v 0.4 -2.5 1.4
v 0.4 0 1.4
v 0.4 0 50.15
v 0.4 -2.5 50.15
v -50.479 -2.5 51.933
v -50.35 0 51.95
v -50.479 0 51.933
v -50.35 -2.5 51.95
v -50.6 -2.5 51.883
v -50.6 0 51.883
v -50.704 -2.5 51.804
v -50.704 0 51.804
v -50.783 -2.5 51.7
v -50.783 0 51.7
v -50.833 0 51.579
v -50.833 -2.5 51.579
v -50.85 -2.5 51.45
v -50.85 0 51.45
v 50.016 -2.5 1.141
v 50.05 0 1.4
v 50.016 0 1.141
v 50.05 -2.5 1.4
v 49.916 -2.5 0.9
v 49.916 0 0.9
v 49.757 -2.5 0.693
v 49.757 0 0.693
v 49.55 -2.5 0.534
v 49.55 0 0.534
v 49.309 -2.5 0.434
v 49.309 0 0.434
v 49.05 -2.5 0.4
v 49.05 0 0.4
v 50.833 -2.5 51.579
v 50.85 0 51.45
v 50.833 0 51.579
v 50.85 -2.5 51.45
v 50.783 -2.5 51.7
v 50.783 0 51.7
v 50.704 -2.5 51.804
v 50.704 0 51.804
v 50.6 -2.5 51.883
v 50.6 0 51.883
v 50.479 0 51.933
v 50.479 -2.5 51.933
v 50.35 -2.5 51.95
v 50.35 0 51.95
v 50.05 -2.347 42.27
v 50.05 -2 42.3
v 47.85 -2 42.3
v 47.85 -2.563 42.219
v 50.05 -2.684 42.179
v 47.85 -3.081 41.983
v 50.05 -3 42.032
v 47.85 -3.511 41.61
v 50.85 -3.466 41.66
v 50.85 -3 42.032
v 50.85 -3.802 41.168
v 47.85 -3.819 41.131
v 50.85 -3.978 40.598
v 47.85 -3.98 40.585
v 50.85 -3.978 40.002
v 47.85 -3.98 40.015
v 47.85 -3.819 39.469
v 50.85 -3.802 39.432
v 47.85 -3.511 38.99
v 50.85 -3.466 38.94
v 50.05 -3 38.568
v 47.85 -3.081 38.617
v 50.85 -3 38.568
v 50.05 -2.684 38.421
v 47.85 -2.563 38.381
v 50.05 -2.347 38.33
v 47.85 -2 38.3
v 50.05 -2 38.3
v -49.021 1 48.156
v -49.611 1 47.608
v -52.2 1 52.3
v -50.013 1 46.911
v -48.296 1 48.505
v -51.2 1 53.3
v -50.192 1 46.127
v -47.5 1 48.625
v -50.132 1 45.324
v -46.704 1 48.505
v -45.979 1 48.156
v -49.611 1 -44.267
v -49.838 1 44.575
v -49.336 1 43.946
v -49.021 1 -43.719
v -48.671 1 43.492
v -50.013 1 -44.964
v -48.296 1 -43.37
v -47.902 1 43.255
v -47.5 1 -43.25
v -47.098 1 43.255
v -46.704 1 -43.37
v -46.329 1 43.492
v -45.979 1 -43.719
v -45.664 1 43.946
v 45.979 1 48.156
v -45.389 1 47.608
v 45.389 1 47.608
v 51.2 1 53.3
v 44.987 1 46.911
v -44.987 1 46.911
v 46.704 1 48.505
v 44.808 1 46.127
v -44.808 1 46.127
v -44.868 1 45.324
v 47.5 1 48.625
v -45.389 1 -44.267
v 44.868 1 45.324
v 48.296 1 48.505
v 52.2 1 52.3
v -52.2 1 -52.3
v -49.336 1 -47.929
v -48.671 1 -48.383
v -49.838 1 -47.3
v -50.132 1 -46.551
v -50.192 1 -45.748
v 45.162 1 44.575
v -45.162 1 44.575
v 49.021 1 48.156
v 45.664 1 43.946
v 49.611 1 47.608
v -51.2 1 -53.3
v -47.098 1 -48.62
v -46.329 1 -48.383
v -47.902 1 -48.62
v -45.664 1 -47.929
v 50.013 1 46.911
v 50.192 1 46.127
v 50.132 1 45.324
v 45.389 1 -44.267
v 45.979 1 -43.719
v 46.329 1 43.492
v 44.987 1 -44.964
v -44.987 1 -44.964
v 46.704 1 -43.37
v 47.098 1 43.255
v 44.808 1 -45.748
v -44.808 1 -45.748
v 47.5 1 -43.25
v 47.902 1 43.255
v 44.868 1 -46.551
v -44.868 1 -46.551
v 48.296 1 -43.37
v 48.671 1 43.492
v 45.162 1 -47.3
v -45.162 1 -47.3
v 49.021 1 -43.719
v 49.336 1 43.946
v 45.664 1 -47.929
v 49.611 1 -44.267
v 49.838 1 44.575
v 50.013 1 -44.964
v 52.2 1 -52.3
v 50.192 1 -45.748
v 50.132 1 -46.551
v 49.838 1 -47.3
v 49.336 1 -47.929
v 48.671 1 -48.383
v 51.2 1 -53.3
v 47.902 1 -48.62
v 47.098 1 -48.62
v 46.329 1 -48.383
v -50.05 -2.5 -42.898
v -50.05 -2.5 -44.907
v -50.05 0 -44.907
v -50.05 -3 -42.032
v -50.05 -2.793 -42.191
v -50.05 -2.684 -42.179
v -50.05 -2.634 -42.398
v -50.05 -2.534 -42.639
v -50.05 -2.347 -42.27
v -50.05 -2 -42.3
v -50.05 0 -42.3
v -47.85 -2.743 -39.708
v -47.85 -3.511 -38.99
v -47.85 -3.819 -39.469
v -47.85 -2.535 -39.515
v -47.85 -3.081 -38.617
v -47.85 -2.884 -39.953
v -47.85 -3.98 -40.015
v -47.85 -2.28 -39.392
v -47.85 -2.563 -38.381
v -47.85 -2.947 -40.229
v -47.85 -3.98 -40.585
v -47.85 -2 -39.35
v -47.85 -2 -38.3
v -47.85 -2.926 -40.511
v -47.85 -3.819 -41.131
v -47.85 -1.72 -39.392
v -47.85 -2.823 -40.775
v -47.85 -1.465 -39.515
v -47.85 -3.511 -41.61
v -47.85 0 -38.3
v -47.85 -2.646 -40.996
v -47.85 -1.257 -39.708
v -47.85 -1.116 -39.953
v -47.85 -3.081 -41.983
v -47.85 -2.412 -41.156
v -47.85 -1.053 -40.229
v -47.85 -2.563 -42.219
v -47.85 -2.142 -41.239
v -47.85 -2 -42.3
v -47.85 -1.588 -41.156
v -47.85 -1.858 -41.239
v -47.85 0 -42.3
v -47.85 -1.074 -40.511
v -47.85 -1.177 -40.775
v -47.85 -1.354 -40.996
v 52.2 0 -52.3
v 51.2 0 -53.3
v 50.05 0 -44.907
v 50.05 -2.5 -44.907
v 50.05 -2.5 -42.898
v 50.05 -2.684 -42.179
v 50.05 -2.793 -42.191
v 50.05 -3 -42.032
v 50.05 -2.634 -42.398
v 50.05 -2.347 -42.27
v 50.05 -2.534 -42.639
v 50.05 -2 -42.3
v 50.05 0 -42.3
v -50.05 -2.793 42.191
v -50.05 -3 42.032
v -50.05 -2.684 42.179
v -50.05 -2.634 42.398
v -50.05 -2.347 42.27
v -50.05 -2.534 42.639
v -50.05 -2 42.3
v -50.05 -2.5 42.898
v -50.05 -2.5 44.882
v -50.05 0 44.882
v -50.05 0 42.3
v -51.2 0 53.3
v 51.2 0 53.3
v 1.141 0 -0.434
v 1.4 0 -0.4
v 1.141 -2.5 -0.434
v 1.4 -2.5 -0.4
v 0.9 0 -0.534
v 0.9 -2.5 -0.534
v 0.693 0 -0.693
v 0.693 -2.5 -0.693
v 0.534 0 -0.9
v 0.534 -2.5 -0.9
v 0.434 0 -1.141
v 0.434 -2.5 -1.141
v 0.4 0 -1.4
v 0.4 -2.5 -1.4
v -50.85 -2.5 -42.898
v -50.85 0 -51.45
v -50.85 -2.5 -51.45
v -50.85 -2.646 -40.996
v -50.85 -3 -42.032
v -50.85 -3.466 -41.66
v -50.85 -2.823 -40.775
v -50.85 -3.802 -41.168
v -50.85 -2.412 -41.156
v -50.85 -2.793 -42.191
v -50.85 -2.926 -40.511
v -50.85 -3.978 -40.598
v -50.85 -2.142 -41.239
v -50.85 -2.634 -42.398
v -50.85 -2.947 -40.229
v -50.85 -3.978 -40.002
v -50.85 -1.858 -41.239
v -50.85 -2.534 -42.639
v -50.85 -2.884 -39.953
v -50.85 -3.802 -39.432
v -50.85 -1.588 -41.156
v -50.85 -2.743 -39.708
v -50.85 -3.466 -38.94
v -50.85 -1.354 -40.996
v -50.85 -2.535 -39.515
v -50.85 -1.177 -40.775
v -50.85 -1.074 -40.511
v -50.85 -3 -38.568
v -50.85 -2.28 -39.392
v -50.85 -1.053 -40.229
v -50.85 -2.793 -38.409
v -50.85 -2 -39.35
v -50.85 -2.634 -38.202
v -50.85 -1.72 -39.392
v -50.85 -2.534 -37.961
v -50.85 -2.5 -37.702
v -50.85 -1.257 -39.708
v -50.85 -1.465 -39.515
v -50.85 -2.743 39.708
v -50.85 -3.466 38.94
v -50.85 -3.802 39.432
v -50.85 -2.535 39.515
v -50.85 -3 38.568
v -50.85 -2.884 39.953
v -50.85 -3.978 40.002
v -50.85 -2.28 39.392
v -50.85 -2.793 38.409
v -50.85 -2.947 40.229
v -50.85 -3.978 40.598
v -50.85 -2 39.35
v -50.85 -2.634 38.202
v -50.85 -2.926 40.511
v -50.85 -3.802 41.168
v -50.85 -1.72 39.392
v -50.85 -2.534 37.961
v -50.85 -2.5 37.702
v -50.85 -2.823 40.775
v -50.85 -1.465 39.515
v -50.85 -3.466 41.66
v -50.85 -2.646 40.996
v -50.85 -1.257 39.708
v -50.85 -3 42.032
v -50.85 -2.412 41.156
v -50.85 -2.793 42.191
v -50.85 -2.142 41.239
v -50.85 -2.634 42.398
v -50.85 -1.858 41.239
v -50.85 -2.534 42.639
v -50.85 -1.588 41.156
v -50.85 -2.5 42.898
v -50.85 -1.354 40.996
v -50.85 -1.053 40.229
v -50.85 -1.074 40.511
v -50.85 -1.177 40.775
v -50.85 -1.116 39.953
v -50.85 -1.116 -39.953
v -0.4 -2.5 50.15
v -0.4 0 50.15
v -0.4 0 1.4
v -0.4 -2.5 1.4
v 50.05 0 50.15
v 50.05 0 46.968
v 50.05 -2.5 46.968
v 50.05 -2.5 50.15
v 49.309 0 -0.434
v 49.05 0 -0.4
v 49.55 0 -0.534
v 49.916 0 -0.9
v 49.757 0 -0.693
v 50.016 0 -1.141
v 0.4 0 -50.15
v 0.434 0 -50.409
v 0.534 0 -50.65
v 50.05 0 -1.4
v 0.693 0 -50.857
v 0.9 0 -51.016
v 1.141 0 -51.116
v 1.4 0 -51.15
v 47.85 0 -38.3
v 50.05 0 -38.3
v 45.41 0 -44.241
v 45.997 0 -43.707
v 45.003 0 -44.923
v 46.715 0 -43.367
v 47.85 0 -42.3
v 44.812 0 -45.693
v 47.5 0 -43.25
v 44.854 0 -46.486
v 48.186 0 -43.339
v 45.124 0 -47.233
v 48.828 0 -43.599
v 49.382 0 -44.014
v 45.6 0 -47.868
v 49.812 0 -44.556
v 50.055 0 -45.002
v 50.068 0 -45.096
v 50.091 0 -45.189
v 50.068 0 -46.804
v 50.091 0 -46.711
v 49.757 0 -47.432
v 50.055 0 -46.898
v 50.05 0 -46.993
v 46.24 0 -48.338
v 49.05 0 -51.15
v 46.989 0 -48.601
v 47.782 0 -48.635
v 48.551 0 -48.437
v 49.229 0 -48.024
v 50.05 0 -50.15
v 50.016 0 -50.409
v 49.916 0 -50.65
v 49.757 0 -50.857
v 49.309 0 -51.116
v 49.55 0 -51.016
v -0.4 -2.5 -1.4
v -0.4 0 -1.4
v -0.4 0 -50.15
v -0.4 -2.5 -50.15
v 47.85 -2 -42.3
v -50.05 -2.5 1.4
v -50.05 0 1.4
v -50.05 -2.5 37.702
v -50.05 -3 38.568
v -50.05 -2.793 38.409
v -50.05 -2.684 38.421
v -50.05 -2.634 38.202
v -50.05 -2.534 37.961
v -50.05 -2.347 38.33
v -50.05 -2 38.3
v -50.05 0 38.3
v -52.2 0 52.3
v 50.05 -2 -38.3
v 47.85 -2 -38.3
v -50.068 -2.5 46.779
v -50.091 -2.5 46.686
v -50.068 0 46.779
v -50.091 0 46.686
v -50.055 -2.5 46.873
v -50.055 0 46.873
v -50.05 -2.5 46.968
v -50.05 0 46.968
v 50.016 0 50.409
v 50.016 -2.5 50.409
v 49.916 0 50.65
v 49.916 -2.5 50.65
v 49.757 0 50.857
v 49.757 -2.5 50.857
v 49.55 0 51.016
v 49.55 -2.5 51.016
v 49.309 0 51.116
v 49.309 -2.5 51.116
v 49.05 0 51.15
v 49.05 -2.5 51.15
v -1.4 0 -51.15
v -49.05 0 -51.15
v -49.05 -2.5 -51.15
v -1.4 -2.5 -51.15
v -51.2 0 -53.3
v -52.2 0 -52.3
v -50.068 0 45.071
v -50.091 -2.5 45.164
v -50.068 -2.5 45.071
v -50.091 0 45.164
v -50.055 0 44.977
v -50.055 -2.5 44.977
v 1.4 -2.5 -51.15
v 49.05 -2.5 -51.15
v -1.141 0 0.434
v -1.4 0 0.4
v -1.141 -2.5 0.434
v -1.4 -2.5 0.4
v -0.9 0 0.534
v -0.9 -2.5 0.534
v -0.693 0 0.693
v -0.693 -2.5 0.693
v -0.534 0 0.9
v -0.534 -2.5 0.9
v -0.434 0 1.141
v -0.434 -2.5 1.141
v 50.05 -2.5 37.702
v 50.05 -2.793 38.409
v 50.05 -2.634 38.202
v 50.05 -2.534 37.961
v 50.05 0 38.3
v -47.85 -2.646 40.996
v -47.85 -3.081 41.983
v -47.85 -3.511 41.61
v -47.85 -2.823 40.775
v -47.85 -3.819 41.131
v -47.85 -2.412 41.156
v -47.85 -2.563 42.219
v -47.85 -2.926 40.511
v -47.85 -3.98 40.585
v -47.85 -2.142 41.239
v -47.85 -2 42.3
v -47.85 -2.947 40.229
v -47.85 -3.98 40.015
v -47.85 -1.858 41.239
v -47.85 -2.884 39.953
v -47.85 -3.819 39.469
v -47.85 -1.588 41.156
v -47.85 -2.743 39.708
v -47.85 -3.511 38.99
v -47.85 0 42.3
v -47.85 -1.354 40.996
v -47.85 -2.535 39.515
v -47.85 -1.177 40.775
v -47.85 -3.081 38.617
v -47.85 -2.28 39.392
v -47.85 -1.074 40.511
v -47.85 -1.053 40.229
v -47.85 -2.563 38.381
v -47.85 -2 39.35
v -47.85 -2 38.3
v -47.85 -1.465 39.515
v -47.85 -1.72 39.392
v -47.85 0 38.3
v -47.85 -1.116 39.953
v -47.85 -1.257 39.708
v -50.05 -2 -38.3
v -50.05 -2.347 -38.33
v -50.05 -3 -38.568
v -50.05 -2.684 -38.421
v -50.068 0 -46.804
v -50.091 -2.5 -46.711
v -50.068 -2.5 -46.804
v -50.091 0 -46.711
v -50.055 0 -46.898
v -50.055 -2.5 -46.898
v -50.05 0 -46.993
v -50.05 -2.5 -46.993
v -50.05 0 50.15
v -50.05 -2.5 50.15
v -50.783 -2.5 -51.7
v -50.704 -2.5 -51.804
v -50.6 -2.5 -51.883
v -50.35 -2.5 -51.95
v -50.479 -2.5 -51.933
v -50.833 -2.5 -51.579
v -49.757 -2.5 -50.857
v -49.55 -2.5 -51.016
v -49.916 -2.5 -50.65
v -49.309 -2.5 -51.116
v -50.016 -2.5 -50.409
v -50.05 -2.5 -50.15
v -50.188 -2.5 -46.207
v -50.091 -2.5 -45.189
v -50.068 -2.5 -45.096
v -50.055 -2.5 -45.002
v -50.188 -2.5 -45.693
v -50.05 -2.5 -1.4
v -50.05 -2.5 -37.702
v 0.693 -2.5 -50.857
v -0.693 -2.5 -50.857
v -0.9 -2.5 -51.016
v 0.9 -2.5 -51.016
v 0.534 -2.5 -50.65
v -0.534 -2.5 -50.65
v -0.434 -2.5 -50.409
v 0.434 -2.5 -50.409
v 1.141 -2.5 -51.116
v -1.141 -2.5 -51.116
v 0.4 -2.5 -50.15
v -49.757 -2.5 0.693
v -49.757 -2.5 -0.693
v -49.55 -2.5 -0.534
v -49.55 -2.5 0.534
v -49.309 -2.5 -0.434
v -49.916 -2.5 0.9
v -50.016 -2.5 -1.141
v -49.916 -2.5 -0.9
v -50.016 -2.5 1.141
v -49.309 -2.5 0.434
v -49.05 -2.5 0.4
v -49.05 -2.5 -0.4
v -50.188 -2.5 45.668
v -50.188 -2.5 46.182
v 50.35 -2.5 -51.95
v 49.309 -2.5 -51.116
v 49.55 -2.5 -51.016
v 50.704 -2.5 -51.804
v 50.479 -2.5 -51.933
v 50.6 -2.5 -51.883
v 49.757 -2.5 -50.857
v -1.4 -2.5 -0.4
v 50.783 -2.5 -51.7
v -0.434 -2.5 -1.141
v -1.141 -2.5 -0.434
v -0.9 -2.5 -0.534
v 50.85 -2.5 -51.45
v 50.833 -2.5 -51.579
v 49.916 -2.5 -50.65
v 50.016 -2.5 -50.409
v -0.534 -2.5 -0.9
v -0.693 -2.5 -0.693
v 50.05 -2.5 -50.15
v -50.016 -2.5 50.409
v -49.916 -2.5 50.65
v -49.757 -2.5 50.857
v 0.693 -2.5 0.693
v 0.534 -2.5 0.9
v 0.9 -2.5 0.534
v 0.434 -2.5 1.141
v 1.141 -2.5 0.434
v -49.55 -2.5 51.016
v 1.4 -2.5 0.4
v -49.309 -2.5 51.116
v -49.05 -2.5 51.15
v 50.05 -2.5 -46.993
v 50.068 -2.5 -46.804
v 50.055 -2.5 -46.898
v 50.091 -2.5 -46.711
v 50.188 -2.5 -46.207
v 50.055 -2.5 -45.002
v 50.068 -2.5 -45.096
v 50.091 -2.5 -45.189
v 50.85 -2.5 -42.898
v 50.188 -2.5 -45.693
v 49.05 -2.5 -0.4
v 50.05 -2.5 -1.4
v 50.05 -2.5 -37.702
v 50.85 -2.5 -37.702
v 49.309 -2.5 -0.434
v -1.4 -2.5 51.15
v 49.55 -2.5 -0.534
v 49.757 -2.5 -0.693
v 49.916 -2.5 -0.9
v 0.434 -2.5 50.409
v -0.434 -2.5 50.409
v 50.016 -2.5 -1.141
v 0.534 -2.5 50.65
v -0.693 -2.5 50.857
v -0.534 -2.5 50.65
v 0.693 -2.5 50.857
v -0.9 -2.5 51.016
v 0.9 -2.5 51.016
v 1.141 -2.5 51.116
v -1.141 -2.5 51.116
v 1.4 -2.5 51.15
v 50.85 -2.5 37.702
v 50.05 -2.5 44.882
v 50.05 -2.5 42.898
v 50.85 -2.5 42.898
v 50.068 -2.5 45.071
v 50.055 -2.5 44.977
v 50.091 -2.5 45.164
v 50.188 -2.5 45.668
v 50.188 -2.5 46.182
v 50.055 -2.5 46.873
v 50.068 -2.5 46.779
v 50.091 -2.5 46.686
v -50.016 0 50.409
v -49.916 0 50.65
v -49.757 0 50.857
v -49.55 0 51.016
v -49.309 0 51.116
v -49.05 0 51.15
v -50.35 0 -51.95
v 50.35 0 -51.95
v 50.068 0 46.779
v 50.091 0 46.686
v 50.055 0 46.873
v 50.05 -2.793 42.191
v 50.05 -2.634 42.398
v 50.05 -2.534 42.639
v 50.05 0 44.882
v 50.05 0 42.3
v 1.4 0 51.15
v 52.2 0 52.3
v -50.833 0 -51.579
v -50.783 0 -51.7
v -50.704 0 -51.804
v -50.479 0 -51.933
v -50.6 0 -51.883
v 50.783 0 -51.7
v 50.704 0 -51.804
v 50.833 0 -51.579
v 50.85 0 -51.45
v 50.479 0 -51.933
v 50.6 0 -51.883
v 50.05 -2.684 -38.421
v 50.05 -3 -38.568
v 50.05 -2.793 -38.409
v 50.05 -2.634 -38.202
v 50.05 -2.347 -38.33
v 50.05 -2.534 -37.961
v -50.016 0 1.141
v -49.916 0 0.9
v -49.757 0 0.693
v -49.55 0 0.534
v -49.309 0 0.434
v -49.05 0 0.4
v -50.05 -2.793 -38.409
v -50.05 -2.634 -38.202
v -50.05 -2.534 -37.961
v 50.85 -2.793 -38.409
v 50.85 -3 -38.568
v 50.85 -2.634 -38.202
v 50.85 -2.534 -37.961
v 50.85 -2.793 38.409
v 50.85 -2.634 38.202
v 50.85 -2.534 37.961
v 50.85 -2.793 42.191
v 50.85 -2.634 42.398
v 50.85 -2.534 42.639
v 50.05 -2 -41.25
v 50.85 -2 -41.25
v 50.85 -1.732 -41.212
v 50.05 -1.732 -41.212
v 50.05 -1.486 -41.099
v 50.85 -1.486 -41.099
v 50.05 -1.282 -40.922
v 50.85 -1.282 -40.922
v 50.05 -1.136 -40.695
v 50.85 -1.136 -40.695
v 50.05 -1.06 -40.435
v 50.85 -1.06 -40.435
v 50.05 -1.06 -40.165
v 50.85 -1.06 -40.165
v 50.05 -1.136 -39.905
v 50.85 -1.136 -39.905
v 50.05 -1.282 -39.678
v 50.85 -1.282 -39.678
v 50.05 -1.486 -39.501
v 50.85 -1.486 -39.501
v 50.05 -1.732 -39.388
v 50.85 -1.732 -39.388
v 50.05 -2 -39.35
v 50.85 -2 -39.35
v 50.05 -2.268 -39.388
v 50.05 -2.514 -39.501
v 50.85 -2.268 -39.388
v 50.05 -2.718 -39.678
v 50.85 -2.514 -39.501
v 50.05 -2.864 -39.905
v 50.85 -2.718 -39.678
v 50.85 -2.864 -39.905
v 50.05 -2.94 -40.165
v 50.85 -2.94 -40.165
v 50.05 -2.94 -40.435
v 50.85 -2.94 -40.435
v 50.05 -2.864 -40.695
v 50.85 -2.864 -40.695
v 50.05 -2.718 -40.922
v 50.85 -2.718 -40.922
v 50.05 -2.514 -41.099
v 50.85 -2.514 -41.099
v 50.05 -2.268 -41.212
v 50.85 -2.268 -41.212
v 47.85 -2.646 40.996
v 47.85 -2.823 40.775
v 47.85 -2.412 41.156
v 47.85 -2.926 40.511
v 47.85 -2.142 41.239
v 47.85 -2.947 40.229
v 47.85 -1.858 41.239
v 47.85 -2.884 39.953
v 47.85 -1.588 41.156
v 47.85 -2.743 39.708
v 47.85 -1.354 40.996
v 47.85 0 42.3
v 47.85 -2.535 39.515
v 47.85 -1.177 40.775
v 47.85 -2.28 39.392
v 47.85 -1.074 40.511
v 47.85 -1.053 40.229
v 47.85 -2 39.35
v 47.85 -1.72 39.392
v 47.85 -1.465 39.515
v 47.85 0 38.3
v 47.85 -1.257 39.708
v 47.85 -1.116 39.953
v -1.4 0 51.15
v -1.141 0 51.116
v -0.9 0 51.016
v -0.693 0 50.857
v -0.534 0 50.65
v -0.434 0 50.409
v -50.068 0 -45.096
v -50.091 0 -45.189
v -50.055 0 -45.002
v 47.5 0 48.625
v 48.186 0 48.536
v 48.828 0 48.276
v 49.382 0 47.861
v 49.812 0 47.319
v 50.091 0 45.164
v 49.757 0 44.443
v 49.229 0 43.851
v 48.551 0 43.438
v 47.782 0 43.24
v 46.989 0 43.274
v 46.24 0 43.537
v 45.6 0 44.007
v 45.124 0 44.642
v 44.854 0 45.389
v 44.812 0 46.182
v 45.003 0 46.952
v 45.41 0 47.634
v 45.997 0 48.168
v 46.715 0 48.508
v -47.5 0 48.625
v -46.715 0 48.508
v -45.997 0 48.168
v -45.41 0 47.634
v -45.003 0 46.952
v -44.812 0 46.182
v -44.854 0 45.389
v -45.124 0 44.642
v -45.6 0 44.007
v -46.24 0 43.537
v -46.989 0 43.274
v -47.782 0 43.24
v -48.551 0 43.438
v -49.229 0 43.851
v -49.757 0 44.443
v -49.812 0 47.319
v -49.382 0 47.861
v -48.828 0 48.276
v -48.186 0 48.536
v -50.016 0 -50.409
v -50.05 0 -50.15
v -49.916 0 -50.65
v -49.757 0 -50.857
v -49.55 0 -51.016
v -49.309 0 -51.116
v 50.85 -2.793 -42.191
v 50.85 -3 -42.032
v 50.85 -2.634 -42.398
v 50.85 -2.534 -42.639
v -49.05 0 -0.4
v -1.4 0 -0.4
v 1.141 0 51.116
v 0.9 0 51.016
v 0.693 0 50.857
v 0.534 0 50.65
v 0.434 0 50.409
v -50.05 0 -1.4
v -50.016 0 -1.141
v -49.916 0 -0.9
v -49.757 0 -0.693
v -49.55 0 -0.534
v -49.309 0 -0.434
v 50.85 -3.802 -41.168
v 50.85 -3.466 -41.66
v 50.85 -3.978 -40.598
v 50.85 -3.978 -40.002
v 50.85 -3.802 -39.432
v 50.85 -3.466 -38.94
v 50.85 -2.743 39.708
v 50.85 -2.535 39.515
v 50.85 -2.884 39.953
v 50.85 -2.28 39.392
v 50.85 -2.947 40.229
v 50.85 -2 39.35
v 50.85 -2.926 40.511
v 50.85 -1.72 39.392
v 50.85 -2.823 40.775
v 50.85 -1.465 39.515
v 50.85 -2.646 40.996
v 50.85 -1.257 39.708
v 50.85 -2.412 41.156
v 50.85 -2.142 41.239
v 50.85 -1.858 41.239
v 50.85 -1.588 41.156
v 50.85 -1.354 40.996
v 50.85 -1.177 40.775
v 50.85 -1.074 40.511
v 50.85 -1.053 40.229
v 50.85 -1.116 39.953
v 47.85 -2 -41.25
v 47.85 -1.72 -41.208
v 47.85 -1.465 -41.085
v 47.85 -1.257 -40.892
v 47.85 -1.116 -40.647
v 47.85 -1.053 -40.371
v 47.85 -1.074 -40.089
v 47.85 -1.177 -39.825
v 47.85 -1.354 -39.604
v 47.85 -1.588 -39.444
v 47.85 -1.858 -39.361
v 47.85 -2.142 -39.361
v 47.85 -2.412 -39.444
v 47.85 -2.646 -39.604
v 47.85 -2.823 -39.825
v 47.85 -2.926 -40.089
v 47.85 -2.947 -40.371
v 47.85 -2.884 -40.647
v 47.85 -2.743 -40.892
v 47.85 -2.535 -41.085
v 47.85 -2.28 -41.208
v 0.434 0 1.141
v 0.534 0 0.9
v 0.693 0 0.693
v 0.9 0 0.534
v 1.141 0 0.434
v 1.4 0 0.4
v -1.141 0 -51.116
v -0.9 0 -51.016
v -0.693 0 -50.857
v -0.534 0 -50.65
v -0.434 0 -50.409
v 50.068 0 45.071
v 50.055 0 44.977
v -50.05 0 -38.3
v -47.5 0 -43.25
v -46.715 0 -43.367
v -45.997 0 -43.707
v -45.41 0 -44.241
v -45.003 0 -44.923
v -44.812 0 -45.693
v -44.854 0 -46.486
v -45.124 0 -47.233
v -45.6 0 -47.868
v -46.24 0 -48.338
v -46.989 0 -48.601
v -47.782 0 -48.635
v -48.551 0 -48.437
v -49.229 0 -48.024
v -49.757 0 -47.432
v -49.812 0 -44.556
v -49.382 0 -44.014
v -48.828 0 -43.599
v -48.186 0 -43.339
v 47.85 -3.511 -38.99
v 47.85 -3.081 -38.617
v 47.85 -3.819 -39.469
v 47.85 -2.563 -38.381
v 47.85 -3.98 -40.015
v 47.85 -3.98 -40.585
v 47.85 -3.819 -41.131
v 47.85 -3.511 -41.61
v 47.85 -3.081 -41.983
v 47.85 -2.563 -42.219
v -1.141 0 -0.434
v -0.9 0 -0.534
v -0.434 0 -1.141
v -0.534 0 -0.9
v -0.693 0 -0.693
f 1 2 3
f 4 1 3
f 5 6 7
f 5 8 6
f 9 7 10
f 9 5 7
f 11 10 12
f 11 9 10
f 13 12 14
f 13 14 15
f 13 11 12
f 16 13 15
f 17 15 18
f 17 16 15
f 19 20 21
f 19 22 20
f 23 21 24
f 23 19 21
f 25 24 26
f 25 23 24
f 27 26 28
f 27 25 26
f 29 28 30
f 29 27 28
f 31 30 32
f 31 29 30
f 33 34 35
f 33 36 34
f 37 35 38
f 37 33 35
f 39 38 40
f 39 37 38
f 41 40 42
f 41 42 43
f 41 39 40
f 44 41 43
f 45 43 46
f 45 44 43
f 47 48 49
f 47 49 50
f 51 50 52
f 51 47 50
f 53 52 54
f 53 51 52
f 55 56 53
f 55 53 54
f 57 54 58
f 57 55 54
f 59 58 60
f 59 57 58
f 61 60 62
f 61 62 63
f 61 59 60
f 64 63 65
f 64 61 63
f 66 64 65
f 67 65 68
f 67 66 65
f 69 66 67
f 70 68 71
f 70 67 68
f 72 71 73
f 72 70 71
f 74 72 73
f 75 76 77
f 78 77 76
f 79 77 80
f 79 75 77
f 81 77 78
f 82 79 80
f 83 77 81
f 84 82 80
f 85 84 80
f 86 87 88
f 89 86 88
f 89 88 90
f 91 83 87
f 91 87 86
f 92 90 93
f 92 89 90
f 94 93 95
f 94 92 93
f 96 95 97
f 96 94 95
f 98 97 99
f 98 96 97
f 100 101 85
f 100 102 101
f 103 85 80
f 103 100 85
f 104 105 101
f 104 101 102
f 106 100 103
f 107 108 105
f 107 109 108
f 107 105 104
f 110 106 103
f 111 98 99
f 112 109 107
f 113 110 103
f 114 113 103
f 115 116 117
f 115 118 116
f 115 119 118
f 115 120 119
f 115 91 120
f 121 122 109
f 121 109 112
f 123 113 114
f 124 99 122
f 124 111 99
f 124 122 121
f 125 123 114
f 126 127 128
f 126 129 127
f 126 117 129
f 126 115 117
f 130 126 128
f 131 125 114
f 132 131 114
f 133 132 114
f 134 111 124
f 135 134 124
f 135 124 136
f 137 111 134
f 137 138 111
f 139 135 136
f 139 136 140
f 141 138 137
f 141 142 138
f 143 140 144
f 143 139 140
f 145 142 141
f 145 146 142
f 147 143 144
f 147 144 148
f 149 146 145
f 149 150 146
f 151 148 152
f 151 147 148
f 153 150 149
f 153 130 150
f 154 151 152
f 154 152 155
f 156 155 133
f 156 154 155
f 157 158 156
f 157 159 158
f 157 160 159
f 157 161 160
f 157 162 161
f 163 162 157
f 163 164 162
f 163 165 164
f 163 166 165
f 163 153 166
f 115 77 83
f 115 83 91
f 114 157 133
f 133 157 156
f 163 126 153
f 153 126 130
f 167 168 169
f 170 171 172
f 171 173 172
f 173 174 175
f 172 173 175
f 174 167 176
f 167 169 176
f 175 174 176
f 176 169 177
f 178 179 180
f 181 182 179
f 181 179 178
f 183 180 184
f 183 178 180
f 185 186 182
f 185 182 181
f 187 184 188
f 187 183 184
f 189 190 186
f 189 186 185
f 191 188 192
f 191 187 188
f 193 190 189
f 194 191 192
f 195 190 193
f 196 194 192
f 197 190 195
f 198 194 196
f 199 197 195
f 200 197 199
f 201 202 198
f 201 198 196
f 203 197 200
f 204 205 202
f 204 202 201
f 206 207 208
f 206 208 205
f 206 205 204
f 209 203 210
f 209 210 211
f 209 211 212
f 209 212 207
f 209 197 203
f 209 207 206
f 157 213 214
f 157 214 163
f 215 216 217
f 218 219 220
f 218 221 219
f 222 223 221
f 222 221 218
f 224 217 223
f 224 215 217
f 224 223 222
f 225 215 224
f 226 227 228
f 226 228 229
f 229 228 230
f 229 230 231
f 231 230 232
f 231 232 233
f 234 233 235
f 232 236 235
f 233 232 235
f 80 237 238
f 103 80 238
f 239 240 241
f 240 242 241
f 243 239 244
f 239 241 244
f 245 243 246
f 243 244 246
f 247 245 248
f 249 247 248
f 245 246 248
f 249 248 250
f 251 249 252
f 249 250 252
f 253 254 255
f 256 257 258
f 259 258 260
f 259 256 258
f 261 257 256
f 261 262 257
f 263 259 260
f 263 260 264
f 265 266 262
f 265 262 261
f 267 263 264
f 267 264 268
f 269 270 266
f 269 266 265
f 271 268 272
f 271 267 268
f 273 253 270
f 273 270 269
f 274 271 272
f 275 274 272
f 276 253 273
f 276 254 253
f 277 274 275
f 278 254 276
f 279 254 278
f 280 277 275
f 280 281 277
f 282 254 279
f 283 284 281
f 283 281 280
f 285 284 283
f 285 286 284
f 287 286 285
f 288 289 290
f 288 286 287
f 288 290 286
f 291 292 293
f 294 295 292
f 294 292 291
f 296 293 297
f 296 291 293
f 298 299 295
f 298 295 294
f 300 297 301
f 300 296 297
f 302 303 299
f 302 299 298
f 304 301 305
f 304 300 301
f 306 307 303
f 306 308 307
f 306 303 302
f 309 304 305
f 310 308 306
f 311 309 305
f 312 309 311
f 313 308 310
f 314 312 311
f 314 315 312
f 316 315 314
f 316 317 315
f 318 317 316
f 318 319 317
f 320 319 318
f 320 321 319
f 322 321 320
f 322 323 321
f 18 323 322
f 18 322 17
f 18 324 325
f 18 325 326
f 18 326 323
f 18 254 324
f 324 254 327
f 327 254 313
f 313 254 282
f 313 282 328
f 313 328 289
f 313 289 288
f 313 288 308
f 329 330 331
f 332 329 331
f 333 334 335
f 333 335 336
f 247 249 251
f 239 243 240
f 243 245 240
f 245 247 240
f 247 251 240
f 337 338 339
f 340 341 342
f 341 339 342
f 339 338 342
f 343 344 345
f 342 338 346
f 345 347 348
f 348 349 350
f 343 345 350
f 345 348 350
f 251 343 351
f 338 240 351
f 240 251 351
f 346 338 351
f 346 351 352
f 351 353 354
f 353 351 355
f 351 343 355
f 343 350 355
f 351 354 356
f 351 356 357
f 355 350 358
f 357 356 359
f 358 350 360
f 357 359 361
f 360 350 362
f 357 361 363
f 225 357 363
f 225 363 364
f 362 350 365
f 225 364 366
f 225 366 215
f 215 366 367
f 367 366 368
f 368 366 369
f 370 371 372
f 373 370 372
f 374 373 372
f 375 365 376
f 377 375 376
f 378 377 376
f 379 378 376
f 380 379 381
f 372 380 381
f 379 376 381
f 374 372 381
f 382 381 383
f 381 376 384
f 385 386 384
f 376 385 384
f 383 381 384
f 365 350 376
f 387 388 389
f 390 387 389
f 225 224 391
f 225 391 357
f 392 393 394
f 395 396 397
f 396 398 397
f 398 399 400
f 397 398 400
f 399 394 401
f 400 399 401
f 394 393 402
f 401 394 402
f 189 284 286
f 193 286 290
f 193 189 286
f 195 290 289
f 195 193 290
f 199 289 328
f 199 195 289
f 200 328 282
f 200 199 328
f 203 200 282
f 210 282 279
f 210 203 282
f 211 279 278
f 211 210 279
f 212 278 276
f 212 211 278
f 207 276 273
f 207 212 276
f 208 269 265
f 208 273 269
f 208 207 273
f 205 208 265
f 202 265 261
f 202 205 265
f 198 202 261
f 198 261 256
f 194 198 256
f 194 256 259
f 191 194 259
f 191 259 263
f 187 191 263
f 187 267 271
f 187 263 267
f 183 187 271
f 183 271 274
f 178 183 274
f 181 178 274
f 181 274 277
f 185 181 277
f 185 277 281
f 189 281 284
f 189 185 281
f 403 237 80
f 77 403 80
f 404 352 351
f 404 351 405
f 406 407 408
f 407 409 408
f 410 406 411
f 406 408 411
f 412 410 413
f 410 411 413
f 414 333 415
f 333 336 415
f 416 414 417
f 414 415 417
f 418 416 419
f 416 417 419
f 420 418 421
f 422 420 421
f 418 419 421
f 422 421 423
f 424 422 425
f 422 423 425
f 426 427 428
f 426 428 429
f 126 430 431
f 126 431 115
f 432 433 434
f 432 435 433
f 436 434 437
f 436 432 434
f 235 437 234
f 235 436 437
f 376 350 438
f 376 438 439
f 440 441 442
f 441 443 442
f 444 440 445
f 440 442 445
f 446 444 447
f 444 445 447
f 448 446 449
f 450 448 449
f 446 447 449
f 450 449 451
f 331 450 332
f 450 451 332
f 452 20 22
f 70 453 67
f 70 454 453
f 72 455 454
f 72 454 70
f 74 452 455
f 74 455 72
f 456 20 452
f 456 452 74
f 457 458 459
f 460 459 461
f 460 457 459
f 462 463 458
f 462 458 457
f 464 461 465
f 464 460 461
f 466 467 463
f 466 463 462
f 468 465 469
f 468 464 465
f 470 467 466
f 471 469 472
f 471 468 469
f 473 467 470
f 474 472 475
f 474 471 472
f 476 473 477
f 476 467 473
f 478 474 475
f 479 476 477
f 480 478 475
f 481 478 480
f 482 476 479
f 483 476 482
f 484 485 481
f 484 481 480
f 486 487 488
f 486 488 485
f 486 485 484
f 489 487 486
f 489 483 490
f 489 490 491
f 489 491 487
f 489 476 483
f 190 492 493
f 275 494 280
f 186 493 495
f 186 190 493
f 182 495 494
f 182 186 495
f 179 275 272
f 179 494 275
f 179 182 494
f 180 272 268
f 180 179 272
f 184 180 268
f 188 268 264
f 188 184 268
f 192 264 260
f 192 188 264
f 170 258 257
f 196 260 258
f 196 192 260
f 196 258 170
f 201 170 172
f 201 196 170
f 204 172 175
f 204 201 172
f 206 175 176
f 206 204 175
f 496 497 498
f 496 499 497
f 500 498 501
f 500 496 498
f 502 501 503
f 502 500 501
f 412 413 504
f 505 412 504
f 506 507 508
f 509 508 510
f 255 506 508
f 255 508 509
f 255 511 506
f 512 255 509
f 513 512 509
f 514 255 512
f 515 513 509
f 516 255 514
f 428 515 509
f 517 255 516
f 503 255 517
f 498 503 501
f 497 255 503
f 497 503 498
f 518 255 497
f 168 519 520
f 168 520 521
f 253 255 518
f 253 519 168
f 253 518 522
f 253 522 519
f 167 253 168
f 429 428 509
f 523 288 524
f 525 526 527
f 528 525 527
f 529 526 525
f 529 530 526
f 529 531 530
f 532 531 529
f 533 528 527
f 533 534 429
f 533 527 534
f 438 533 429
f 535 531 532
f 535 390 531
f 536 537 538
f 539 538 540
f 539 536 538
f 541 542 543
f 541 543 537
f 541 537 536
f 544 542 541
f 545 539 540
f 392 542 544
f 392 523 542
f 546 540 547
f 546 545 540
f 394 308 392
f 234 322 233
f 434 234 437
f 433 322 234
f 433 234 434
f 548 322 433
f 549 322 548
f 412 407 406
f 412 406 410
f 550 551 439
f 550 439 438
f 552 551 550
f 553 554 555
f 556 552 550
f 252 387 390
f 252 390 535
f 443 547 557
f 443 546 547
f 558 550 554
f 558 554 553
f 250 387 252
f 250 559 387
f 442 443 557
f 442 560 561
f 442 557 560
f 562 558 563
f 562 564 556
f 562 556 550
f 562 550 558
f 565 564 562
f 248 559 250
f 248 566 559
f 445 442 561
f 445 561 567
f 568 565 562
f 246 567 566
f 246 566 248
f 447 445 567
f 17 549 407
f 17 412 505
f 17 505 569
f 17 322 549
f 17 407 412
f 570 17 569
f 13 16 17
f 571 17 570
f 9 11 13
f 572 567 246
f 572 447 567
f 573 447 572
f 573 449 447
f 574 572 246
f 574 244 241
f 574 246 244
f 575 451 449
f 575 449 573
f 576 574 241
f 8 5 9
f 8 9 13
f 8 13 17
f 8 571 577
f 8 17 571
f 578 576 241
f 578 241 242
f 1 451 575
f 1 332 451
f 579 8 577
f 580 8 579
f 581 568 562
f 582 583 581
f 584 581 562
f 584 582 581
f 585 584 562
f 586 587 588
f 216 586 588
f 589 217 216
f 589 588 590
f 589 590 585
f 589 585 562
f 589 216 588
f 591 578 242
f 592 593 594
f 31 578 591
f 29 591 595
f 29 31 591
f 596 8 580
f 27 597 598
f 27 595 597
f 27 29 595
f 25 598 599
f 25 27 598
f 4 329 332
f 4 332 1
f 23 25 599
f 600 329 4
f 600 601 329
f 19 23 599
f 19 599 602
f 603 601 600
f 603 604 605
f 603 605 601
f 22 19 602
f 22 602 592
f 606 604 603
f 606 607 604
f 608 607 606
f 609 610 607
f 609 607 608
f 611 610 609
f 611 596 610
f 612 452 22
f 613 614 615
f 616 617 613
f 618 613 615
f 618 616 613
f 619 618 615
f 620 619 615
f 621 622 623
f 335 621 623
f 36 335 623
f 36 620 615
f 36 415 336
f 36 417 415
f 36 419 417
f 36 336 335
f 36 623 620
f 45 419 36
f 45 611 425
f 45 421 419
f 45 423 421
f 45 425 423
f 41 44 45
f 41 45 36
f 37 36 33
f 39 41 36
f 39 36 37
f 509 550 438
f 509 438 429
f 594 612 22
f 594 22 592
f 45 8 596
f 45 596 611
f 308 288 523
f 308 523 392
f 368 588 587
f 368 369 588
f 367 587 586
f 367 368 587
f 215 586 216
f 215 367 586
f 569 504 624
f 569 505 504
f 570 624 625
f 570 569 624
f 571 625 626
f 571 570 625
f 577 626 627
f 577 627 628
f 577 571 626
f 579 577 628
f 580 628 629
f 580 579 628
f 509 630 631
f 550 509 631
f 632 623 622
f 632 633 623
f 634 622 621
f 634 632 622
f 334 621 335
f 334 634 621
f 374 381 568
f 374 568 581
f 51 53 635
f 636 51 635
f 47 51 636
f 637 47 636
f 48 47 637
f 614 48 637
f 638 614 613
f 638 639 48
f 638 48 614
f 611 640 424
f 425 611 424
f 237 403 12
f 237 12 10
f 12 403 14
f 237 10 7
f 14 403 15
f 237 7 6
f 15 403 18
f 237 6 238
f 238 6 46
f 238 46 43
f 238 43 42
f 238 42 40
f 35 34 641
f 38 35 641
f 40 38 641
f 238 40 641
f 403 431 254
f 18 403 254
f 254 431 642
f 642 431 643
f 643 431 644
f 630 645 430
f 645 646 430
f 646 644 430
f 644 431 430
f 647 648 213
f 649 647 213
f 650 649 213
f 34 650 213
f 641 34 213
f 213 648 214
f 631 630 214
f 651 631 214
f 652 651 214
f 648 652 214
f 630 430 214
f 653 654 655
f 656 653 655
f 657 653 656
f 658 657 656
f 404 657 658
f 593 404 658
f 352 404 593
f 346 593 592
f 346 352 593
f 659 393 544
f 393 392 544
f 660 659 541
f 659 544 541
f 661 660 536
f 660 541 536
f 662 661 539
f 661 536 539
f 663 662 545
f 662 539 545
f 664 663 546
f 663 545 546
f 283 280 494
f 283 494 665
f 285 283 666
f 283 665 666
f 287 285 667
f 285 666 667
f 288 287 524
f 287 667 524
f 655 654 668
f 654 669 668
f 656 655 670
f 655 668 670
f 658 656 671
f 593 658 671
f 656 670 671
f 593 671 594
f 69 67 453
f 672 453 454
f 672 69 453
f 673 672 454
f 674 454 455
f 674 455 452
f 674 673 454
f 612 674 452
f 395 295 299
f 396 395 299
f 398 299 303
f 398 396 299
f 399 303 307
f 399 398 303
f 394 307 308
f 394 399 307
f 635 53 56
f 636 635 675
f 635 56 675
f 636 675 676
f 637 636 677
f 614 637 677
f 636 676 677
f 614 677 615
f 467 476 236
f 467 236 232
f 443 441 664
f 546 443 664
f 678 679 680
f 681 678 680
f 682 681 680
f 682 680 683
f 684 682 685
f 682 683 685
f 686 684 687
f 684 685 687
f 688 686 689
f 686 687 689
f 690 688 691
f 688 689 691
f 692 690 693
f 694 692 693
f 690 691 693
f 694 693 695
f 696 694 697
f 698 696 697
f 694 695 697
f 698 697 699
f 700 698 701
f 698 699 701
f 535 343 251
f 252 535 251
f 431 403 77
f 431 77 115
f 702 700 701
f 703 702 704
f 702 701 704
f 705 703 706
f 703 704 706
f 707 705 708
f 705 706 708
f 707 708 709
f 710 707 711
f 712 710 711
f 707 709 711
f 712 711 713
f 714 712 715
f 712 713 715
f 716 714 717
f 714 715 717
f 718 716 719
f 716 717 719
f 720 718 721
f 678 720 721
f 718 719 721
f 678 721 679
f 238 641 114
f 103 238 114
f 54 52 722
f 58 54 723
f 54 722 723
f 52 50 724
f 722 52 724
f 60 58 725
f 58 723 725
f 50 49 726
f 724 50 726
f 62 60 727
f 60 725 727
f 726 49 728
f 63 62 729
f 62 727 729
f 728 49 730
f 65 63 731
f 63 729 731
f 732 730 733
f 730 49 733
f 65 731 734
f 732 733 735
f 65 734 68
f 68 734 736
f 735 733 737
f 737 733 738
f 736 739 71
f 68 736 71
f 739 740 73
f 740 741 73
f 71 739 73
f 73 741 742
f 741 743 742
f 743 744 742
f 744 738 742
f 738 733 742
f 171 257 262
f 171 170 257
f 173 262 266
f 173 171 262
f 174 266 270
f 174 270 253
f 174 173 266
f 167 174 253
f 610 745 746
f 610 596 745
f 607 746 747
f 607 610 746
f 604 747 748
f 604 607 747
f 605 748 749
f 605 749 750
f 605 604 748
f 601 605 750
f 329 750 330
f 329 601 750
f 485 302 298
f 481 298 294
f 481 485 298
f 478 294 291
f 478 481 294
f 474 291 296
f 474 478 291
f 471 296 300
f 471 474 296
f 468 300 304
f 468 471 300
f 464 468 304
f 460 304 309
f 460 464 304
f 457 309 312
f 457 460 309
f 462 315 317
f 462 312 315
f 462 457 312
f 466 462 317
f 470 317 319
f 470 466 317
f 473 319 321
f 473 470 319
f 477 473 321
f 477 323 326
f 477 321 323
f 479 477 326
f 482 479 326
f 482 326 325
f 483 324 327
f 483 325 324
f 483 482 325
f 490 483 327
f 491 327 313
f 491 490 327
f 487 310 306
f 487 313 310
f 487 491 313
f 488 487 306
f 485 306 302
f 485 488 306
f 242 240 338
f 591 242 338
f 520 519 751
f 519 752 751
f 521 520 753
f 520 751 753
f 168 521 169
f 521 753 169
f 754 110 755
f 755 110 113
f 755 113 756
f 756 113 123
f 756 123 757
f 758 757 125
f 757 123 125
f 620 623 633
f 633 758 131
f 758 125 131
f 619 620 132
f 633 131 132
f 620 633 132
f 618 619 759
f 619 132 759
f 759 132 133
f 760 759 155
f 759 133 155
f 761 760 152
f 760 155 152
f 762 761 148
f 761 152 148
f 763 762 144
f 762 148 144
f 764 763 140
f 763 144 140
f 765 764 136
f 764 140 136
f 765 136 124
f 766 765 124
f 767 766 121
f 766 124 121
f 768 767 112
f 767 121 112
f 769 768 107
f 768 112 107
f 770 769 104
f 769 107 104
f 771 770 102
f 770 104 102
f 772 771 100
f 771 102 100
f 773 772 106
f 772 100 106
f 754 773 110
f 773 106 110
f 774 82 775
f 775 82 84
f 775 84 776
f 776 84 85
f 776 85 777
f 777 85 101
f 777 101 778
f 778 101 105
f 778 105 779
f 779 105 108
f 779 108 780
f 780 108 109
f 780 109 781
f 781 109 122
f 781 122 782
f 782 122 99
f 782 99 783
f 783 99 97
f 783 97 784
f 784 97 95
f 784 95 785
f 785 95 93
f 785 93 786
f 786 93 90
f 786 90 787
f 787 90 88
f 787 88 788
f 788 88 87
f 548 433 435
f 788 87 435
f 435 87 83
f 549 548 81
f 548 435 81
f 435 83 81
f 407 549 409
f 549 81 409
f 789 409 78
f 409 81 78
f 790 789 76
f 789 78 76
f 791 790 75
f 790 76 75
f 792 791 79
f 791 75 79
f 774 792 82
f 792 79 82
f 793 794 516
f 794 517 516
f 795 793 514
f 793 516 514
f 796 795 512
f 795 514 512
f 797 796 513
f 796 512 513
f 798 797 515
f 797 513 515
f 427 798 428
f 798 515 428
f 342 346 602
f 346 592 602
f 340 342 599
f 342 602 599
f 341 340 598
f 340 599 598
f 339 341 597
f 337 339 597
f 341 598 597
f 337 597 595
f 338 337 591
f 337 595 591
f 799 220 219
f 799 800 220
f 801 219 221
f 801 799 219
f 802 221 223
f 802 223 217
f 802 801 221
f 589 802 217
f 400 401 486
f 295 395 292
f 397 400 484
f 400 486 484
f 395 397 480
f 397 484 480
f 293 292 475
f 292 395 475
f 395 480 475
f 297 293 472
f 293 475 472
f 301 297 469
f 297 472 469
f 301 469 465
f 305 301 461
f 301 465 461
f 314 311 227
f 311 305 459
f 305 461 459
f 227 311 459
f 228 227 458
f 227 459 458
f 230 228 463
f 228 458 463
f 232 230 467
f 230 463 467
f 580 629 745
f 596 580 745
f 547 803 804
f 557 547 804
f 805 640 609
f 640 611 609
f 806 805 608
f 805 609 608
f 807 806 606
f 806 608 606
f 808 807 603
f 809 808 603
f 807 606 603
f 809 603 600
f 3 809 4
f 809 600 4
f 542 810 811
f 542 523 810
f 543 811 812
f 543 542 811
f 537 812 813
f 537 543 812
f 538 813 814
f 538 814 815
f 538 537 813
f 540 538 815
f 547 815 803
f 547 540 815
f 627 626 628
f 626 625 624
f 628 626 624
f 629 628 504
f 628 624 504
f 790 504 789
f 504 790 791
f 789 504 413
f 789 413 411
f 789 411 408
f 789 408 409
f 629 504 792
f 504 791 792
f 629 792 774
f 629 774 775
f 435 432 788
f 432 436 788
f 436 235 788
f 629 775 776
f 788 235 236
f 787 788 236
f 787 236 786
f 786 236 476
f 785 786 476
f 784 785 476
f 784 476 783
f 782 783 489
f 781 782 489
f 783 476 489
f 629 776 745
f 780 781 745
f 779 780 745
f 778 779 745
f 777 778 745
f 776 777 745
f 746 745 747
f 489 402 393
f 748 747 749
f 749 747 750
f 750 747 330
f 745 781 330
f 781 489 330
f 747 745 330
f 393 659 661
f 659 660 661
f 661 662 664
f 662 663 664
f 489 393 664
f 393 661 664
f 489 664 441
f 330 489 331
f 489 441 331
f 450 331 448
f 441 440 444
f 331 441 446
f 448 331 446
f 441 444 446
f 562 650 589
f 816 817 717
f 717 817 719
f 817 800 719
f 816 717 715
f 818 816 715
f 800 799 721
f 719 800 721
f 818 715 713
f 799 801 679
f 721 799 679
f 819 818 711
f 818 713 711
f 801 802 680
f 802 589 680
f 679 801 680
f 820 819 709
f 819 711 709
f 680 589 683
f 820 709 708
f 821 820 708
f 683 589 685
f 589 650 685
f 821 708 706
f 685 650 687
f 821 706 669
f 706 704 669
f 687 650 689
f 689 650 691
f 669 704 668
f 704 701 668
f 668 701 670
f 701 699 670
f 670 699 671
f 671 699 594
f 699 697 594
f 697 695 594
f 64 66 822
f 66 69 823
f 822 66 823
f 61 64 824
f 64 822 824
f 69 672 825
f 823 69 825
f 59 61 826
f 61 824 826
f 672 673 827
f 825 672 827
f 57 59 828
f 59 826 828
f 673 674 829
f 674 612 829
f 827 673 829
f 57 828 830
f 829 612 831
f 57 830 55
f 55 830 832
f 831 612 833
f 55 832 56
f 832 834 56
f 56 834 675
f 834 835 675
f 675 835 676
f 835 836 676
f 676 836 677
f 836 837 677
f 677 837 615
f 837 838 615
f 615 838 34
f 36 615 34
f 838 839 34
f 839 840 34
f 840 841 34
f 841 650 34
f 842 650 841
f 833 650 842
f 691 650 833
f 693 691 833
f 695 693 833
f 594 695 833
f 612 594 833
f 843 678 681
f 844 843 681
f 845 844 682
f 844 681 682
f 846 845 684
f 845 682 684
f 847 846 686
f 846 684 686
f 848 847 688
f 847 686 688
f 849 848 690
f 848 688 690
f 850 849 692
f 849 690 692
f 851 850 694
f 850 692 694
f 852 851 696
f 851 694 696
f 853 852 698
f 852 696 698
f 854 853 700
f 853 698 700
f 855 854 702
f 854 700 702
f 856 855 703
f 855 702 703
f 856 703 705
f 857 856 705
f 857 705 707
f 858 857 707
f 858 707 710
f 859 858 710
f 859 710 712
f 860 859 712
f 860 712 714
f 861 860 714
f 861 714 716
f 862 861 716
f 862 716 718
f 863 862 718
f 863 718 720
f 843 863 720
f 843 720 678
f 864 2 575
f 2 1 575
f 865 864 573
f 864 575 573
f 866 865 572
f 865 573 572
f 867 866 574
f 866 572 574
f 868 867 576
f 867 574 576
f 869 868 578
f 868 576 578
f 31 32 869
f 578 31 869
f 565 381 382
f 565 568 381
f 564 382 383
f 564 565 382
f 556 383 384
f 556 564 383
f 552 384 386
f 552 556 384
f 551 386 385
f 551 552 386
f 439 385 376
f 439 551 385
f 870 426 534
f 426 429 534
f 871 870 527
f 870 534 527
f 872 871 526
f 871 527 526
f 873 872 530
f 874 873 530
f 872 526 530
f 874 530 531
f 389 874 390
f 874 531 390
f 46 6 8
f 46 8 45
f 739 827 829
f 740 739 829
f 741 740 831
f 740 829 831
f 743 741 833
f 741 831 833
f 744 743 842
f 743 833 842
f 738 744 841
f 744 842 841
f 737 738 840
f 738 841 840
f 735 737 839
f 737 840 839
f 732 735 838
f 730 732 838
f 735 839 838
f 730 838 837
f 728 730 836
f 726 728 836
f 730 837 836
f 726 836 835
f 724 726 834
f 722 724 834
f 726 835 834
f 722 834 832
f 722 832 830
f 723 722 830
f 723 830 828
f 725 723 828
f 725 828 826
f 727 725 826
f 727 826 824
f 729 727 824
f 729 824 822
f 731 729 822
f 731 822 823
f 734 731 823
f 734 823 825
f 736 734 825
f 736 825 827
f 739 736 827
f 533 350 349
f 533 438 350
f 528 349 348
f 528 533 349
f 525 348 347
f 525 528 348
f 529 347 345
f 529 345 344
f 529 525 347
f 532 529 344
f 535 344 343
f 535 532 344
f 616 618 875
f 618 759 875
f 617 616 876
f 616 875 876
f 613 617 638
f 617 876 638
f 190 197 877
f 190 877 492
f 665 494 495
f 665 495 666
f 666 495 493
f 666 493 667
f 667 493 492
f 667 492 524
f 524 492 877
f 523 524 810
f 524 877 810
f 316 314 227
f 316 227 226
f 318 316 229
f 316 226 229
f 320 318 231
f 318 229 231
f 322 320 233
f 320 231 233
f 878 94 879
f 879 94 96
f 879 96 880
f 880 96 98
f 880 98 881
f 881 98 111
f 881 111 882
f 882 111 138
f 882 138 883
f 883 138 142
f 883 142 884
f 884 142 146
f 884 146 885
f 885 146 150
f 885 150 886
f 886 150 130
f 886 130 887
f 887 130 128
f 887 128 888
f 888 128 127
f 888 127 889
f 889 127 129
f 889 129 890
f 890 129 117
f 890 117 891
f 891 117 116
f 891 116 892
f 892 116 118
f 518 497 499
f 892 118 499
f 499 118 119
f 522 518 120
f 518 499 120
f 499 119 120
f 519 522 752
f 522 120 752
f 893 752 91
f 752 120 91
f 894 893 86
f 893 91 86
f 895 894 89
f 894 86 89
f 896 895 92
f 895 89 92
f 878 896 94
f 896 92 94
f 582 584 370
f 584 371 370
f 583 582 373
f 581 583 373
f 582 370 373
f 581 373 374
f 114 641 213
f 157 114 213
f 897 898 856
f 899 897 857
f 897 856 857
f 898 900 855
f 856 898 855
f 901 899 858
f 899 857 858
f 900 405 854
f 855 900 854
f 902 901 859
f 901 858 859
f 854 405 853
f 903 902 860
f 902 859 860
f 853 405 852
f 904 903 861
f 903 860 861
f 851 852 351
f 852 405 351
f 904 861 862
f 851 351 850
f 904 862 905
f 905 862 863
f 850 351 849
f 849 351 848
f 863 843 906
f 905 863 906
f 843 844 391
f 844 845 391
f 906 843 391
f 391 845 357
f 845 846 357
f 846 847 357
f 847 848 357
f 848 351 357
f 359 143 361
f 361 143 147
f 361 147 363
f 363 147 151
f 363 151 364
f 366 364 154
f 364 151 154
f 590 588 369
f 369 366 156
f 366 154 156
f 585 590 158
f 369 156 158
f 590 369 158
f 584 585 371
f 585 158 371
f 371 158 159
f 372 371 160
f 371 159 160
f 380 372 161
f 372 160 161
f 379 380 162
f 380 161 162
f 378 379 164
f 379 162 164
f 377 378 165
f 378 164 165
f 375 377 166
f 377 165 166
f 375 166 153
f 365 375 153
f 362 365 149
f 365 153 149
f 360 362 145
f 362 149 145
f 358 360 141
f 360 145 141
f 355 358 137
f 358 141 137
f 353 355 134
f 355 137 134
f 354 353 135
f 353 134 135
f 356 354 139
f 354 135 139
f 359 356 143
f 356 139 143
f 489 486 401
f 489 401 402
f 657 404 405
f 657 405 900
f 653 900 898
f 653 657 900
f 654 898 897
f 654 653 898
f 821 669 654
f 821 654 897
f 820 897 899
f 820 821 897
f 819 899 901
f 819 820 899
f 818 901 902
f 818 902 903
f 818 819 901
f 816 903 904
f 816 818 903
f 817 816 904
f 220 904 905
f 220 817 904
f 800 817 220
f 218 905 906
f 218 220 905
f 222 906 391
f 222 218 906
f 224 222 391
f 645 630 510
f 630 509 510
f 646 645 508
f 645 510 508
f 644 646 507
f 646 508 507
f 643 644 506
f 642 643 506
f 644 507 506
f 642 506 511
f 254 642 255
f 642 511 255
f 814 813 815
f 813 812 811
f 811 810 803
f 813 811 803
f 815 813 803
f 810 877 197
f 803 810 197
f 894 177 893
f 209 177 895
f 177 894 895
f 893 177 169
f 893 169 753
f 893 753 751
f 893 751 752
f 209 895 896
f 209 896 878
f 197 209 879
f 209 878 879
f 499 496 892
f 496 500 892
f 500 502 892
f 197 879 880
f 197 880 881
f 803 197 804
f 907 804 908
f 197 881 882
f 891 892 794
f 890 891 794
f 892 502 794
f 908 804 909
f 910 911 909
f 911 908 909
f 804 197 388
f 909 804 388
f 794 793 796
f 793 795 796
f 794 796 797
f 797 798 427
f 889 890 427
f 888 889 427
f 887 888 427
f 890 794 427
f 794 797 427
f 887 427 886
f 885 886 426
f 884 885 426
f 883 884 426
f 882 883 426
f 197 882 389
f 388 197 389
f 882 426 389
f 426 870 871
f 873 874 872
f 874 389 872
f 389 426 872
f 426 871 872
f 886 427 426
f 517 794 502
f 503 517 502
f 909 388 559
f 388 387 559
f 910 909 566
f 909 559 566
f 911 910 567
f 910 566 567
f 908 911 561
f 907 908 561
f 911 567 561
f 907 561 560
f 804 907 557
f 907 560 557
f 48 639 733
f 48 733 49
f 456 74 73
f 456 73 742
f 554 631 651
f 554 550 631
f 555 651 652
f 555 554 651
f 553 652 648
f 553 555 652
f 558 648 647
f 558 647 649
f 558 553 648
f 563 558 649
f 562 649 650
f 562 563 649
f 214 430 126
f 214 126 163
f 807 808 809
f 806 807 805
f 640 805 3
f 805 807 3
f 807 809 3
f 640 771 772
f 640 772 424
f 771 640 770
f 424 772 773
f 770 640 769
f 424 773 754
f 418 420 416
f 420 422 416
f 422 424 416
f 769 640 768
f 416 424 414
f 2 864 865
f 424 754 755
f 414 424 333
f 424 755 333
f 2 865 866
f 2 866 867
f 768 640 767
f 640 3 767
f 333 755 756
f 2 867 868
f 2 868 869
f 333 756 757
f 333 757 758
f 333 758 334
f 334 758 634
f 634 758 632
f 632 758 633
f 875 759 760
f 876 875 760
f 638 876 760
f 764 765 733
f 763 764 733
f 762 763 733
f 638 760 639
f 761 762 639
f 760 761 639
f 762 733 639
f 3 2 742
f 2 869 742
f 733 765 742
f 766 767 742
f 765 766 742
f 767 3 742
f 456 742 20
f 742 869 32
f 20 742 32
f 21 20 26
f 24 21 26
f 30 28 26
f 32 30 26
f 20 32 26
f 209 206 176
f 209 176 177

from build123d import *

# Parameters (mm, degrees)
SKETCH_1_W          = 104.4
SKETCH_1_H          = 106.6
EXTRUDE_1_DEPTH     = 1
SKETCH_2_W          = 101.7
SKETCH_2_H          = 103.9
SKETCH_2_W_2        = 100.1
SKETCH_2_H_2        = 102.3
EXTRUDE_2_DEPTH     = 2.5
SKETCH_4_R          = 2.7
CUT_EXTRUDE_1_DEPTH = 75.685875505
EXTRUDE_3_DEPTH     = 2.5
FILLET_1_R          = 1
FILLET_2_R          = 0.5
CHAMFER_1_SIZE      = 1
SKETCH_6_R          = 2
SKETCH_6_R_2        = 0.95
EXTRUDE_4_DEPTH     = 0.8
EXTRUDE_START       = -0.8
SKETCH_7_R          = 2
SKETCH_7_R_2        = 0.95
EXTRUDE_5_DEPTH     = 0.8
SKETCH_8_R          = 0.95
CUT_EXTRUDE_2_DEPTH = 0.8
CUT_EXTRUDE_START   = -0.8
SKETCH_9_R          = 0.95
CUT_EXTRUDE_3_DEPTH = 0.8
FILLET_3_R          = 1
EXTRUDE_START_2     = -3
SKETCH_10_R         = 0.95
EXTRUDE_6_DEPTH     = 3
SKETCH_11_R         = 0.95
EXTRUDE_7_DEPTH     = 3


with BuildPart() as part:
    # 草图1 → 凸台-拉伸1 (new body)
    with BuildSketch(Plane(origin=(0, 0, 0), x_dir=(1, 0, 0), z_dir=(0, 1, 0))):
        Rectangle(SKETCH_1_W, SKETCH_1_H)
    extrude(amount=EXTRUDE_1_DEPTH)

    # 草图2 → 凸台-拉伸2 (add)
    with BuildSketch(Plane.XZ):
        Rectangle(SKETCH_2_W, SKETCH_2_H)
        Rectangle(SKETCH_2_W_2, SKETCH_2_H_2, mode=Mode.SUBTRACT)
    extrude(amount=EXTRUDE_2_DEPTH)

    # 草图4 → 切除-拉伸1 (cut, through all)
    with BuildSketch(Plane(origin=(0, 1, 0), x_dir=(1, 0, 0), z_dir=(0, 1, 0))):
        with Locations(Location((47.5, 45.95, 0), (0, 0, 270))):
            Circle(SKETCH_4_R)
        with Locations(Location((-47.5, 45.95, 0), (0, 0, 270))):
            Circle(SKETCH_4_R)
        with Locations(Location((-47.5, -45.925, 0), (0, 0, 270))):
            Circle(SKETCH_4_R)
        with Locations(Location((47.5, -45.925, 0), (0, 0, 270))):
            Circle(SKETCH_4_R)
    extrude(amount=-CUT_EXTRUDE_1_DEPTH, mode=Mode.SUBTRACT)

    # 草图5 → 凸台-拉伸3 (add)
    with BuildSketch(Plane.XZ):
        Polygon((0.4, 51.15), (-0.4, 51.15), (-0.4, 0.4), (-50.05, 0.4), (-50.05, -0.4), (-0.4, -0.4), (-0.4, -51.15), (0.4, -51.15), (0.4, -0.4), (50.05, -0.4), (50.05, 0.4), (0.4, 0.4), align=None)
    extrude(amount=EXTRUDE_3_DEPTH)

    # 圆角1
    fillet_1_edges = [part.edges().sort_by_distance(p)[0] for p in [
        (-0.4, -1.25, 0.4),
        (-50.05, -1.25, 0.4),
        (-50.05, -1.25, -0.4),
        (50.05, -1.25, -0.4),
        (0.4, -1.25, 0.4),
        (50.05, -1.25, 0.4),
        (0.4, -1.25, -0.4),
        (0.4, -1.25, -51.15),
        (-0.4, -1.25, -51.15),
        (-0.4, -1.25, -0.4),
        (0.4, -1.25, 51.15),
        (-0.4, -1.25, 51.15),
        (50.05, -1.25, -51.15),
        (50.05, -1.25, 51.15),
        (-50.05, -1.25, 51.15),
        (-50.05, -1.25, -51.15),
        (50.05, -1.25, 46.812411967),
        (50.05, -1.25, 45.037588033),
        (-50.05, -1.25, 45.037588033),
        (-50.05, -1.25, 46.812411967),
        (-50.05, -1.25, -46.837411967),
        (-50.05, -1.25, -45.062588033),
        (50.05, -1.25, -45.062588033),
        (50.05, -1.25, -46.837411967),
    ]]
    fillet(fillet_1_edges, radius=FILLET_1_R)

    # 圆角2
    fillet_2_edges = [part.edges().sort_by_distance(p)[0] for p in [
        (-50.85, -1.25, -51.95),
        (50.85, -1.25, -51.95),
        (50.85, -1.25, 51.95),
        (-50.85, -1.25, 51.95),
    ]]
    fillet(fillet_2_edges, radius=FILLET_2_R)

    # 倒角1
    chamfer_1_edges = [part.edges().sort_by_distance(p)[0] for p in [
        (52.2, 0.5, 53.3),
        (-52.2, 0.5, 53.3),
        (-52.2, 0.5, -53.3),
        (52.2, 0.5, -53.3),
    ]]
    chamfer(chamfer_1_edges, length=CHAMFER_1_SIZE)

    # 草图6 → 凸台-拉伸4 (add)
    # profile 1 of 2: a face of its own
    with BuildSketch(Plane(origin=(50.85, 0, 0), x_dir=(0, 0, -1), z_dir=(1, 0, 0))):
        with Locations((-40.3, -2)):
            Circle(SKETCH_6_R)
        with Locations((-40.3, -2)):
            Circle(SKETCH_6_R_2, mode=Mode.SUBTRACT)
    # profile 2 of 2: a face of its own
    with BuildSketch(Plane(origin=(50.85, 0, 0), x_dir=(0, 0, -1), z_dir=(1, 0, 0))):
        with Locations((40.3, -2)):
            Circle(SKETCH_6_R)
        with Locations((40.3, -2)):
            Circle(SKETCH_6_R_2, mode=Mode.SUBTRACT)
    extrude(amount=-EXTRUDE_4_DEPTH)

    # 草图7 → 凸台-拉伸5 (add)
    # profile 1 of 2: a face of its own
    with BuildSketch(Plane.ZY.offset(50.85).offset(EXTRUDE_START)):
        with Locations((-40.3, -2)):
            Circle(SKETCH_7_R)
        with Locations((-40.3, -2)):
            Circle(SKETCH_7_R_2, mode=Mode.SUBTRACT)
    # profile 2 of 2: a face of its own
    with BuildSketch(Plane.ZY.offset(50.85).offset(EXTRUDE_START)):
        with Locations((40.3, -2)):
            Circle(SKETCH_7_R)
        with Locations((40.3, -2)):
            Circle(SKETCH_7_R_2, mode=Mode.SUBTRACT)
    extrude(amount=EXTRUDE_5_DEPTH)

    # 草图8 → 切除-拉伸2 (cut)
    with BuildSketch(Plane(origin=(50.85, 0, 0), x_dir=(0, 0, -1), z_dir=(1, 0, 0))):
        with Locations(Location((40.3, -2, 0), (0, 0, 180))):
            Circle(SKETCH_8_R)
        with Locations((-40.3, -2)):
            Circle(SKETCH_8_R)
    extrude(amount=-CUT_EXTRUDE_2_DEPTH, mode=Mode.SUBTRACT)

    # 草图9 → 切除-拉伸3 (cut)
    with BuildSketch(Plane.ZY.offset(50.85).offset(CUT_EXTRUDE_START)):
        with Locations(Location((40.3, -2, 0), (0, 0, 180))):
            Circle(SKETCH_9_R)
        with Locations((-40.3, -2)):
            Circle(SKETCH_9_R)
    extrude(amount=CUT_EXTRUDE_3_DEPTH, mode=Mode.SUBTRACT)

    # 圆角3
    fillet_3_edges = [part.edges().sort_by_distance(p)[0] for p in [
        (50.45, -2.5, 38.363508327),
        (50.45, -2.5, 42.236491673),
        (50.45, -2.5, -42.236491673),
        (50.45, -2.5, -38.363508327),
        (-50.45, -2.5, -38.363508327),
        (-50.45, -2.5, -42.236491673),
        (-50.45, -2.5, 42.236491673),
        (-50.45, -2.5, 38.363508327),
    ]]
    fillet(fillet_3_edges, radius=FILLET_3_R)

    # 草图10 → 凸台-拉伸6 (add)
    # profile 1 of 2: a face of its own
    with BuildSketch(Plane.ZY.offset(50.85).offset(EXTRUDE_START_2)):
        with BuildLine():
            Line((-42.3, -2), (-42.3, 0))
            Line((-42.3, 0), (-38.3, 0))
            Line((-38.3, 0), (-38.3, -2))
            ThreePointArc((-38.3, -2), (-40.3, -4), (-42.3, -2))
        make_face()
        with Locations((-40.3, -2)):
            Circle(SKETCH_10_R, mode=Mode.SUBTRACT)
    # profile 2 of 2: a face of its own
    with BuildSketch(Plane.ZY.offset(50.85).offset(EXTRUDE_START_2)):
        with BuildLine():
            Line((38.3, -2), (38.3, 0))
            Line((38.3, 0), (42.3, 0))
            Line((42.3, 0), (42.3, -2))
            ThreePointArc((42.3, -2), (40.3, -4), (38.3, -2))
        make_face()
        with Locations(Location((40.3, -2, 0), (0, 0, 180))):
            Circle(SKETCH_10_R, mode=Mode.SUBTRACT)
    extrude(amount=EXTRUDE_6_DEPTH)

    # 草图11 → 凸台-拉伸7 (add)
    # profile 1 of 2: a face of its own
    with BuildSketch(Plane(origin=(50.85, 0, 0), x_dir=(0, 0, -1), z_dir=(1, 0, 0))):
        with BuildLine():
            Line((-38.3, -2), (-38.3, 0))
            Line((-38.3, 0), (-42.3, 0))
            Line((-42.3, 0), (-42.3, -2))
            ThreePointArc((-42.3, -2), (-40.3, -4), (-38.3, -2))
        make_face()
        with Locations((-40.3, -2)):
            Circle(SKETCH_11_R, mode=Mode.SUBTRACT)
    # profile 2 of 2: a face of its own
    with BuildSketch(Plane(origin=(50.85, 0, 0), x_dir=(0, 0, -1), z_dir=(1, 0, 0))):
        with BuildLine():
            Line((42.3, -2), (42.3, 0))
            Line((42.3, 0), (38.3, 0))
            Line((38.3, 0), (38.3, -2))
            ThreePointArc((38.3, -2), (40.3, -4), (42.3, -2))
        make_face()
        with Locations((40.3, -2)):
            Circle(SKETCH_11_R, mode=Mode.SUBTRACT)
    extrude(amount=-EXTRUDE_7_DEPTH)


solid = part.part
